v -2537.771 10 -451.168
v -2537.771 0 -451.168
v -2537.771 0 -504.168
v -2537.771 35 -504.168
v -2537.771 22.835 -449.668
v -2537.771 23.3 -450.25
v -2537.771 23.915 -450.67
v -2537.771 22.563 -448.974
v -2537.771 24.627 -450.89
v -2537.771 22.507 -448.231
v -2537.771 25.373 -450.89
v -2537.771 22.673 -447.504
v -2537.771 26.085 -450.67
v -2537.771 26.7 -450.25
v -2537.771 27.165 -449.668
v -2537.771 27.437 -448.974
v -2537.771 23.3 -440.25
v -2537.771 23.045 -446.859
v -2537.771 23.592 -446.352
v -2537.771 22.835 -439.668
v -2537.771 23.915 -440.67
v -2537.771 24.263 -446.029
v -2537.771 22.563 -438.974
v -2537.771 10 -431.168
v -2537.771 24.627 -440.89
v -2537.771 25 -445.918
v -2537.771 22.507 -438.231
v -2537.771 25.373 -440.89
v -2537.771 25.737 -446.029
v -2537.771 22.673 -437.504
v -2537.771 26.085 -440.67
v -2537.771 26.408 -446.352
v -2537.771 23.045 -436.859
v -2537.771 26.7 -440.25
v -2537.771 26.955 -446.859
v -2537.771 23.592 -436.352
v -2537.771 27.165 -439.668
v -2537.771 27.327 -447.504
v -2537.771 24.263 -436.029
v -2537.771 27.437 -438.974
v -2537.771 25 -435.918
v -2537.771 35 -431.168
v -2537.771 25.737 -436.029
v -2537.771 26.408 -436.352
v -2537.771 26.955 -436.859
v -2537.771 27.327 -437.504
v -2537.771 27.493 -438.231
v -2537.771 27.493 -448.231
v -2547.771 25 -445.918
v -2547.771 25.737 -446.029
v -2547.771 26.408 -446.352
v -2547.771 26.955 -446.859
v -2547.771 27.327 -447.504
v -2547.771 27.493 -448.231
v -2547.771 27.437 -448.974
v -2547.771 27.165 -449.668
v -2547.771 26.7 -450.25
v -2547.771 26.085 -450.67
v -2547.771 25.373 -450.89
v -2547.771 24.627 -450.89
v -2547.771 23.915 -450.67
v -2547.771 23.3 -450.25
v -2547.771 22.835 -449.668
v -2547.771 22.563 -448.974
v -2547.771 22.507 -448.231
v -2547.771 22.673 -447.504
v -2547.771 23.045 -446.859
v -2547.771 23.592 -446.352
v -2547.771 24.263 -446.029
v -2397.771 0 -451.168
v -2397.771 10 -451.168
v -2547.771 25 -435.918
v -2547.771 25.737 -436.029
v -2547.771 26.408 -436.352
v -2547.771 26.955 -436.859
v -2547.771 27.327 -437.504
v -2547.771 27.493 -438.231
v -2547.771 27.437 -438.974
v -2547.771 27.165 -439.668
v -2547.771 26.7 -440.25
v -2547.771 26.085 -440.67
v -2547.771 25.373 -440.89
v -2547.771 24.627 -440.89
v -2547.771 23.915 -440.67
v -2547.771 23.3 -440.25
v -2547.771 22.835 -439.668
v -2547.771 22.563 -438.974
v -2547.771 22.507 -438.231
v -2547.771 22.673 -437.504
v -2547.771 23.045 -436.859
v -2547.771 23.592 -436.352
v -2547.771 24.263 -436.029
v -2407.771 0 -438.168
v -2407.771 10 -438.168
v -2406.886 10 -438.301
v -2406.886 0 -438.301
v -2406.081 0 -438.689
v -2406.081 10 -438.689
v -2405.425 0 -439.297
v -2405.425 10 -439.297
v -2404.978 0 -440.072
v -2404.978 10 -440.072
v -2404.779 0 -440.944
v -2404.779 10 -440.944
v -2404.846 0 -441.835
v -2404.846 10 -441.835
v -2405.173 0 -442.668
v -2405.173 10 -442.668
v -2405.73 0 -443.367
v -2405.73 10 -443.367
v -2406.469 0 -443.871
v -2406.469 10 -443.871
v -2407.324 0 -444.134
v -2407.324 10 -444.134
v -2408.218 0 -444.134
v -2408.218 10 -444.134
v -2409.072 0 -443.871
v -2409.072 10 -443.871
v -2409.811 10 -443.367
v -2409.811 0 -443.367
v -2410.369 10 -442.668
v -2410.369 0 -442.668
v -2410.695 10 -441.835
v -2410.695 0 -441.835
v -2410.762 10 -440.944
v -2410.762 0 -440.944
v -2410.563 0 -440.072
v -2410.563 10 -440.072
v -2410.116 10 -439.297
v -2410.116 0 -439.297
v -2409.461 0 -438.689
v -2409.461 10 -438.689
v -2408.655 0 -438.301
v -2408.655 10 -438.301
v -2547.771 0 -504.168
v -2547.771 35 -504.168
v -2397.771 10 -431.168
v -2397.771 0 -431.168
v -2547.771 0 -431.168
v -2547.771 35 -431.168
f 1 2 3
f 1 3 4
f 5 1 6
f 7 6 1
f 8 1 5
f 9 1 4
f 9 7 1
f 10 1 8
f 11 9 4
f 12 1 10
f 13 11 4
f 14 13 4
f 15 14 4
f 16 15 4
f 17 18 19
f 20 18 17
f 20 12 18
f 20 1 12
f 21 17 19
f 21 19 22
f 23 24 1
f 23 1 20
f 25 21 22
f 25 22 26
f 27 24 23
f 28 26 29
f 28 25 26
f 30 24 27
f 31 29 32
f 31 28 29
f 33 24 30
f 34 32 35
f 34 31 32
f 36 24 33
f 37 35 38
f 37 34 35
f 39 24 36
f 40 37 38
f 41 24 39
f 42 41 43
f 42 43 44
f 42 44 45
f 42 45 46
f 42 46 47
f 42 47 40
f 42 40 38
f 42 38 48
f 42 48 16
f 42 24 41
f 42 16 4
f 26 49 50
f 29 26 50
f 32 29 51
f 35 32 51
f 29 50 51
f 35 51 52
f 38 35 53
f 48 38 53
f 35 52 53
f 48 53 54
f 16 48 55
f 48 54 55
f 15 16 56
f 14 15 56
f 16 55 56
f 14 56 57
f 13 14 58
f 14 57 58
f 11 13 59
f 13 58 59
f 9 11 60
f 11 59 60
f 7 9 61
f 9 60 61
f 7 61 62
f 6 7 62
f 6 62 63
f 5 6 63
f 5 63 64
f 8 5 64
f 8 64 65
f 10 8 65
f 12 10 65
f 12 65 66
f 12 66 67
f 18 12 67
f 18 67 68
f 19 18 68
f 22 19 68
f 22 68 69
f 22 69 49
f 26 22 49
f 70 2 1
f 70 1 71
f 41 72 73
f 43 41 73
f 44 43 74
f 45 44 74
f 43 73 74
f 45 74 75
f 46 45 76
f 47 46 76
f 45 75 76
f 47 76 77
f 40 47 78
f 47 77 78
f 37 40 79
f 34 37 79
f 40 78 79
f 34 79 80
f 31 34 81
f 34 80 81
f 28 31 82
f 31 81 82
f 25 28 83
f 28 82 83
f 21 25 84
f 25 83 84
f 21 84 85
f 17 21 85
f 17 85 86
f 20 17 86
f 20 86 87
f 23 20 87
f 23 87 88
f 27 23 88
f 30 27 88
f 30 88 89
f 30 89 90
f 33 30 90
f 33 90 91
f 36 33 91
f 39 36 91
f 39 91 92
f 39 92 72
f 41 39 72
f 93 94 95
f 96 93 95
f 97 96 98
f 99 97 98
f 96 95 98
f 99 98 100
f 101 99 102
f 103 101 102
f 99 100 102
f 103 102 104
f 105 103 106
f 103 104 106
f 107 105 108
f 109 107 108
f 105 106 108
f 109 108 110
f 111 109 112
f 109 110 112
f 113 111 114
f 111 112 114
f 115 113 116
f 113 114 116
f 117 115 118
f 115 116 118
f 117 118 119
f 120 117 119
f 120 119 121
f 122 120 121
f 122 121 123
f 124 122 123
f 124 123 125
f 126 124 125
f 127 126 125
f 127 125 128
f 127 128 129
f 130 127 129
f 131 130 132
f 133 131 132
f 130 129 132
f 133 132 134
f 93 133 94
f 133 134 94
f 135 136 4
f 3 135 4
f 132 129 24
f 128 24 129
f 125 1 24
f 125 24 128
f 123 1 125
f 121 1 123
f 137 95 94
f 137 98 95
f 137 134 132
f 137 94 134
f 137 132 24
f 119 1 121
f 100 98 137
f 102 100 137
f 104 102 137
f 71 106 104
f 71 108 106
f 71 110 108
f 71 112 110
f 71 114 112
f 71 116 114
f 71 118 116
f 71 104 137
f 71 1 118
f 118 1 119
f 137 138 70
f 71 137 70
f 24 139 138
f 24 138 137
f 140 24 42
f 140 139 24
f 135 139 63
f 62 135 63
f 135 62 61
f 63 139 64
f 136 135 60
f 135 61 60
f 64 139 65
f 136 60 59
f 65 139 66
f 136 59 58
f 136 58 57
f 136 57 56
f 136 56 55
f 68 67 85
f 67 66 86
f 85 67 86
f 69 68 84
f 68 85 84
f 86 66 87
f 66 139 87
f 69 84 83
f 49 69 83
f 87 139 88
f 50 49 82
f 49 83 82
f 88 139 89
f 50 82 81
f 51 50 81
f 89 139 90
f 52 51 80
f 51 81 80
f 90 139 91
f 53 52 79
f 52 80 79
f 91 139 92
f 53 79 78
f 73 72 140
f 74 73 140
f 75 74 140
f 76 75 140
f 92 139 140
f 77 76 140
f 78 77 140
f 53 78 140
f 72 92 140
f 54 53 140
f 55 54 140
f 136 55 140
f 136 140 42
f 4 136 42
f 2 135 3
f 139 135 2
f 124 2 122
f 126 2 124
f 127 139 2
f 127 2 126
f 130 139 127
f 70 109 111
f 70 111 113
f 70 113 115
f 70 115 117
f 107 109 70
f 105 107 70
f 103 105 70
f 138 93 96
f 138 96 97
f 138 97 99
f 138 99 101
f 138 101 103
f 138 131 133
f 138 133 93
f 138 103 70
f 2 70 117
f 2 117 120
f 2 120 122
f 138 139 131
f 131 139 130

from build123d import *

# Parameters (mm, degrees)
SKETCH1_W           = 150
SKETCH1_H           = 20
BOSS_EXTRUDE1_DEPTH = 10
SKETCH2_R           = 3
CUT_EXTRUDE1_DEPTH  = 10
SKETCH3_W           = 23
SKETCH3_H           = 25
BOSS_EXTRUDE2_DEPTH = 10
SKETCH4_R           = 2.5
CUT_EXTRUDE2_DEPTH  = 480.576193501
BOSS_EXTRUDE4_START = -20
SKETCH5_W           = 10
SKETCH5_H           = 35
BOSS_EXTRUDE4_DEPTH = 53


with BuildPart() as part:
    # Sketch1 → Boss-Extrude1 (new body)
    with BuildSketch(Plane(origin=(0, 0, 0), x_dir=(1, 0, 0), z_dir=(0, 1, 0))):
        with Locations((-2472.770700637, 441.167728238)):
            Rectangle(SKETCH1_W, SKETCH1_H)
    extrude(amount=BOSS_EXTRUDE1_DEPTH)

    # Sketch2 → Cut-Extrude1 (cut)
    with BuildSketch(Plane(origin=(0, 10, 0), x_dir=(1, 0, 0), z_dir=(0, 1, 0))):
        with Locations(Location((-2407.770700637, 441.167728238, 0), (0, 0, 270))):
            Circle(SKETCH2_R)
    extrude(amount=-CUT_EXTRUDE1_DEPTH, mode=Mode.SUBTRACT)

    # Sketch3 → Boss-Extrude2 (add)
    with BuildSketch(Plane.ZY.offset(2547.770700637)):
        with Locations((-442.667728238, 22.5)):
            Rectangle(SKETCH3_W, SKETCH3_H)
    extrude(amount=-BOSS_EXTRUDE2_DEPTH)

    # Sketch4 → Cut-Extrude2 (cut, through all)
    with BuildSketch(Plane.ZY.offset(2547.770700637)):
        with Locations((-448.417728238, 25)):
            Circle(SKETCH4_R)
        with Locations((-438.417728238, 25)):
            Circle(SKETCH4_R)
    extrude(amount=-CUT_EXTRUDE2_DEPTH, mode=Mode.SUBTRACT)

    # Sketch5 → Boss-Extrude4 (add)
    with BuildSketch(Plane.XY.offset(-431.167728238).offset(BOSS_EXTRUDE4_START)):
        with Locations((-2542.770700637, 17.5)):
            Rectangle(SKETCH5_W, SKETCH5_H)
    extrude(amount=-BOSS_EXTRUDE4_DEPTH)


solid = part.part
